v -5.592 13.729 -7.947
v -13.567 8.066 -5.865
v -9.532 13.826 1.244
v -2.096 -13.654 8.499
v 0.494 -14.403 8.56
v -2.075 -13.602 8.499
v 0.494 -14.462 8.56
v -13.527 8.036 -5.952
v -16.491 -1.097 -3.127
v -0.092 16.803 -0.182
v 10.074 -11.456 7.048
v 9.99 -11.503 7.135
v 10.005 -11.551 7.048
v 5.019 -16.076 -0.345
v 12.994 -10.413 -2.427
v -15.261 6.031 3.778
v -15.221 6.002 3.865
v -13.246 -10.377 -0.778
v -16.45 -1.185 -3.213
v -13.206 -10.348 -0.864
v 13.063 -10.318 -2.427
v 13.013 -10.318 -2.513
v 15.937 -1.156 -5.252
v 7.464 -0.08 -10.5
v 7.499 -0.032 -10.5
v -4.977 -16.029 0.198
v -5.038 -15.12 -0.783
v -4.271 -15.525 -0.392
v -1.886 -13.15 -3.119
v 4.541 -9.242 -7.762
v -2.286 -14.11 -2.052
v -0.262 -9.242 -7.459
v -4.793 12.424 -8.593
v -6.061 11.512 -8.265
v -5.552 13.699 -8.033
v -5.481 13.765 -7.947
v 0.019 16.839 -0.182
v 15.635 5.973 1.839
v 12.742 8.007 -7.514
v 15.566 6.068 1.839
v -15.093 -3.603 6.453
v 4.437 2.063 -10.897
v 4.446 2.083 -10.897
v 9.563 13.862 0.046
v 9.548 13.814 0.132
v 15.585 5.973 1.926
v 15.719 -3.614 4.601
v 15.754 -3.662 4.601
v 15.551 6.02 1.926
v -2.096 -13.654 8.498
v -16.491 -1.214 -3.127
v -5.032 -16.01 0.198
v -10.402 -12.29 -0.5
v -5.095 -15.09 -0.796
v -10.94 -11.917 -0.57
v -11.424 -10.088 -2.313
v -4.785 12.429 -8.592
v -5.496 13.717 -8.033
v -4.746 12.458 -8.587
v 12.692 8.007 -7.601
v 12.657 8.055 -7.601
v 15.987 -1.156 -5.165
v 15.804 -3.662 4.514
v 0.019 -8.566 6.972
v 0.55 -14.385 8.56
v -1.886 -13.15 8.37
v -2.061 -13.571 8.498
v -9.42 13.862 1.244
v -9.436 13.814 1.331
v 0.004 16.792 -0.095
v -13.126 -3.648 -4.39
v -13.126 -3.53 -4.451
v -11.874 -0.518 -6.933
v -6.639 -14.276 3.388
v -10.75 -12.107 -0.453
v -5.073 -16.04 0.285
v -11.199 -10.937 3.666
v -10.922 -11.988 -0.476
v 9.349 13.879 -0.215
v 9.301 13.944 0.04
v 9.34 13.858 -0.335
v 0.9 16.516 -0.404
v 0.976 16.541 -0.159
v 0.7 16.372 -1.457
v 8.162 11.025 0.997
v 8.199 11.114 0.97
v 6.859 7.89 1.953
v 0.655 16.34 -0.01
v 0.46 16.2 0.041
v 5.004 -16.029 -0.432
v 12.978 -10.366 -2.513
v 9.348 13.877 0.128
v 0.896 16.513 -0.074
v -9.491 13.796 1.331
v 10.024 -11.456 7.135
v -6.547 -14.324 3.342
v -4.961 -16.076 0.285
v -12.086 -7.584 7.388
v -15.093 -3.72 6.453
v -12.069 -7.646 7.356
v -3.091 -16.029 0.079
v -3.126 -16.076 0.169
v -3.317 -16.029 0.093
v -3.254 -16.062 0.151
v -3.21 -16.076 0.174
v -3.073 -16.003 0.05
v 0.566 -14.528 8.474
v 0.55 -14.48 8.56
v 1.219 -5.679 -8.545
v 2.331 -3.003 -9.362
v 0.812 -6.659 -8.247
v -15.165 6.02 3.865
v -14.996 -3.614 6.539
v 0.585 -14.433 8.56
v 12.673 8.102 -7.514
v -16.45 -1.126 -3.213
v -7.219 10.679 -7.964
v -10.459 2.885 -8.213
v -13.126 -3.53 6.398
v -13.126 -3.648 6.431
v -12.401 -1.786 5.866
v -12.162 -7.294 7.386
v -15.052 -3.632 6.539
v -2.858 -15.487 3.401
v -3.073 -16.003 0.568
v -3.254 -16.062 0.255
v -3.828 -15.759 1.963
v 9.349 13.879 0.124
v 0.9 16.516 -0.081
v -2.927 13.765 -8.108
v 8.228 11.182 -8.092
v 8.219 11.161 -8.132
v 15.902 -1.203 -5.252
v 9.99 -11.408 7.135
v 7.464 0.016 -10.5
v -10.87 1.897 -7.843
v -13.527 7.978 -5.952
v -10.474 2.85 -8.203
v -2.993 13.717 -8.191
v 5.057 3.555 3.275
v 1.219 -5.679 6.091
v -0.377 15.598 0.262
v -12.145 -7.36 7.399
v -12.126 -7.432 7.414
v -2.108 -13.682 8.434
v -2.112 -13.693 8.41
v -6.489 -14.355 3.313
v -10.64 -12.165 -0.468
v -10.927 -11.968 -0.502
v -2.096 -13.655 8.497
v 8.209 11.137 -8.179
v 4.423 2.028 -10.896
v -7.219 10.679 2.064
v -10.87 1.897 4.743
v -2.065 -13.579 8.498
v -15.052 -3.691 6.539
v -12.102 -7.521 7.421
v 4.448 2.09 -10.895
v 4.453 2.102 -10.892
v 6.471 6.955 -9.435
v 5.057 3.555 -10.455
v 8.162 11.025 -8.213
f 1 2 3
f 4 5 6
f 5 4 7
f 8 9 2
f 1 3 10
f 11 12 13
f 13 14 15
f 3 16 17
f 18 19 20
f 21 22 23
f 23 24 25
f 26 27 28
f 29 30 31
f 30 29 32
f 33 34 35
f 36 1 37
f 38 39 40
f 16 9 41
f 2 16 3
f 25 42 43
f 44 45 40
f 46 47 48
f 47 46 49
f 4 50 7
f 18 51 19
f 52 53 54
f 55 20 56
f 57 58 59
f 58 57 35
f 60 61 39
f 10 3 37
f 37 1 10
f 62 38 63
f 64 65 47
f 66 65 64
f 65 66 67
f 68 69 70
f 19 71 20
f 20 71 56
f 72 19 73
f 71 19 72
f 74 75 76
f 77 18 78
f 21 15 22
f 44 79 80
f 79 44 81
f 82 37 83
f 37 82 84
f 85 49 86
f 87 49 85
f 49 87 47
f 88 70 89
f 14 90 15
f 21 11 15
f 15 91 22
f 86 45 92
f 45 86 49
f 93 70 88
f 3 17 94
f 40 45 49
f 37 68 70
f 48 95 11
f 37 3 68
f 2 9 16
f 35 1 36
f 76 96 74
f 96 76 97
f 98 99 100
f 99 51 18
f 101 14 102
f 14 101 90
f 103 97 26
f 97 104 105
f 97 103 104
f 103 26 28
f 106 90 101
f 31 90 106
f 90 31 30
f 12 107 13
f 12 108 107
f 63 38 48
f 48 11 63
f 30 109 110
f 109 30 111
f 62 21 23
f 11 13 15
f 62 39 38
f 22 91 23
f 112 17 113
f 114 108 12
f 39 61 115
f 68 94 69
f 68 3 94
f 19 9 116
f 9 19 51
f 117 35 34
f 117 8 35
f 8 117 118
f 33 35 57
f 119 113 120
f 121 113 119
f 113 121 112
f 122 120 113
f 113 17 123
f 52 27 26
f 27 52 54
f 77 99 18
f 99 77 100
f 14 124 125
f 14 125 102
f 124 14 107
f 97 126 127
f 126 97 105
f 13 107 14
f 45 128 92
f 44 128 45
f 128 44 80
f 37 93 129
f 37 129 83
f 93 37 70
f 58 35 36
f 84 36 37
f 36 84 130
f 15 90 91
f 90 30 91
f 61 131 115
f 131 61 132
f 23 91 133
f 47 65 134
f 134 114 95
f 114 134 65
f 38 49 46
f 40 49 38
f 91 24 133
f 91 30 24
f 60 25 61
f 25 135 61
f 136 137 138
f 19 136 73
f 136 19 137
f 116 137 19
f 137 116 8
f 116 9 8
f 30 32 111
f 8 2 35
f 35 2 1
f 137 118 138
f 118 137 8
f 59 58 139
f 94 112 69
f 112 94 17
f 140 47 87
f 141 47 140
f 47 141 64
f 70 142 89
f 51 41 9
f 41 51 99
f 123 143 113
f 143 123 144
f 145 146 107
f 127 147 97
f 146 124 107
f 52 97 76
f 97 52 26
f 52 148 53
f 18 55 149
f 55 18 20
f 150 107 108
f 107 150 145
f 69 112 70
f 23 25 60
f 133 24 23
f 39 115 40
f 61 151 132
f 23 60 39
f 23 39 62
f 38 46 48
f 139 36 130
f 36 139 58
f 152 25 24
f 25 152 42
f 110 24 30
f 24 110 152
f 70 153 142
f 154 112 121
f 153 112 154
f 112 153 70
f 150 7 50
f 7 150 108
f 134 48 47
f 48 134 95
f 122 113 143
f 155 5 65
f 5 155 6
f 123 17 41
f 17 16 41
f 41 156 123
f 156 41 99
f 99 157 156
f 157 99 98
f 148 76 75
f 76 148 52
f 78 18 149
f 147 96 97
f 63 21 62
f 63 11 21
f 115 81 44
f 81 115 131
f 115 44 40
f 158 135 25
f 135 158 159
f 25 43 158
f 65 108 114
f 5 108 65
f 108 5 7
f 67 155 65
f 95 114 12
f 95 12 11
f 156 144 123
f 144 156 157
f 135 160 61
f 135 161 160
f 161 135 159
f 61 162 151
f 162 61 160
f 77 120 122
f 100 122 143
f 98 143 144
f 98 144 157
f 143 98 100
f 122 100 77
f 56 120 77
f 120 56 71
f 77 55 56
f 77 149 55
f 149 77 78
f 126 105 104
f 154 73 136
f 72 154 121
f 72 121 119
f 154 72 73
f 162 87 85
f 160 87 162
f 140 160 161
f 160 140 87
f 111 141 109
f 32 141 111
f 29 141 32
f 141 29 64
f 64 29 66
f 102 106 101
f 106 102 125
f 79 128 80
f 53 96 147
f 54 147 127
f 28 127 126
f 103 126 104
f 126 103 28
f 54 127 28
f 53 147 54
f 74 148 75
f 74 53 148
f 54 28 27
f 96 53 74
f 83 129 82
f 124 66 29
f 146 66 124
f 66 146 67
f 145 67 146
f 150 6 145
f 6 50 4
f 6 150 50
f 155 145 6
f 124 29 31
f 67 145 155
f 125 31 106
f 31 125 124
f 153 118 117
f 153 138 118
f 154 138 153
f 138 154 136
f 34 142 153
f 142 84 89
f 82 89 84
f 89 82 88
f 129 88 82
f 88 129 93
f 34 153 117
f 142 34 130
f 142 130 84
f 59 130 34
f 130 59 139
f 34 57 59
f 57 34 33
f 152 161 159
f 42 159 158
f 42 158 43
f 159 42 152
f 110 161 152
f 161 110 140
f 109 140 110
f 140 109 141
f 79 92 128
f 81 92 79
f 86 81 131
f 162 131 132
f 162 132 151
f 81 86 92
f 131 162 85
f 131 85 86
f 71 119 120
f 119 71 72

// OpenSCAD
// Auto-generated OpenSCAD file

    inner_points = 10*[[0.0981256772482181, 1.6457575604228036, -0.49999971188637654], [-1.0832035552174737, -1.1961778079047776, 0.5000005689987711], [-0.1274890829740991, 1.102996499198401, -1.309016652616536], [0.09812663002150081, 1.6457572632118638, 0.5000002881131254], [-1.0832045079907566, -1.1961775106938377, -0.49999943100073085], [-0.8575887949951567, -0.6534167466803746, 1.3090175097289307], [-0.4925404806041831, 0.22479035715641538, -1.618033560192892], [-0.127486588581261, 1.1029957210900594, 1.3090173361320547], [-0.8575912893879948, -0.6534159685720329, -1.3090164790196603], [-0.4925373973650727, 0.224789395361611, 1.6180344173052863], [0.8062478731875907, 1.1025170792040677, -0.951057064318678], [0.9248610728923187, 1.3878632992834963, -5.762265201658678e-07], [-0.317262991238858, -1.6003240717335458, -2.808858743374998e-07], [-0.19864979153413004, -1.314977851654117, 0.9510562072062835], [0.495716297128712, 0.3554704111460145, -1.5388422427756967], [0.8062496854700688, 1.102516513875266, 0.951055968270682], [-0.19865160381660824, -1.3149772863253153, -0.9510568253830763], [0.11188178452474858, -0.5679311835960638, 1.5388413856633023], [0.1118788521901014, -0.5679302688748477, -1.538842151510418], [0.4957192294633592, 0.3554694964247984, 1.5388412943980236], [-0.7138464220032689, 1.0620613123307217, -0.4999991117419643], [-1.3045110382361147, -0.3589063718330689, 1.0287006094733542e-06], [-0.7138454692299859, 1.062061015119782, 0.5000008882575375], [-1.0788962780137976, 0.18385468939133373, 0.8090179694307691], [-1.0788978196333527, 0.183855170288736, -0.8090160193183198]];

    outer_points = 10*[[-1.6409889130468513, -0.11555950142177197, -0.3126779904387301], [1.5886524541888336, -0.11555950142177197, -0.5165225244336256], [-1.348640822211601, 0.8007073739998204, -0.5865166414544996], [-1.3165303884764263, -1.0318263768433644, -0.07777018120554417], [1.2641939296184086, 0.8007073739998204, -0.7514303336668116], [1.2963043633535833, -1.0318263768433644, -0.24268387341785624], [-0.5511531501235996, 1.3669914457760302, -0.7946890769982492], [-0.4991973769465854, -1.5981104486195743, 0.028479987340757858], [0.4468609180885676, 1.3669914457760302, -0.8576805022131136], [0.4988166912655817, -1.5981104486195743, -0.03451143787410652], [-1.5180582313930455, 0.5972695048350894, 0.3778021724529971], [-1.5011767773548241, -0.3661505019915455, 0.6452660147863529], [1.5535132362128419, 0.5972695048350894, 0.1839345000860028], [1.5703946902510633, -0.3661505019915455, 0.4513983424193586], [-0.9450976637241996, 1.376692663078665, 0.12439394786230915], [-0.9009014432726172, -1.1455736602351207, 0.8246233778526778], [0.9532379021306351, 1.376692663078665, 0.004577137019677928], [0.9974341225822174, -1.1455736602351207, 0.7048065670100466], [-0.001146536984352193, 1.674405817908923, -0.018165330220834972], [0.05348299584236998, -1.4432868150653788, 0.8473658450931907], [-0.8699212728256985, -0.0032034345028971734, -0.9394401530094331], [0.744899410792144, -0.0032034345028971734, -1.0413624200068807], [-0.5454627482552734, -0.9194703099244896, -0.704532343776247], [0.4525513199568937, -0.9194703099244896, -0.7675237689911114], [-0.07243360073769692, 0.5630806372733126, -1.1476125885531827]];

    // Convex hull for inner set (I)
    module inner_hull() {
        hull() {
            for (p = inner_points) {
                translate(p) sphere(r=0.1);
            }
        }
    }

    // Convex hull for outer set (O) minus inner hull (O \ I)
    module outer_minus_inner() {
        difference() {
            hull() {
                for (p = outer_points) {
                    translate(p) sphere(r=0.1);
                }
            }
            inner_hull(); // Subtract inner hull
        }
    }

    // Convex hull for outer set (O) minus all translated inner hulls
    module outer_minus_AllTranslationInner() {
        difference() {
            hull() {
                for (p = outer_points) {
                    translate(p) sphere(r=0.1);
                }
            }
            hull() {
                translate([0,0,50]) inner_hull();
                translate([0,0,-50]) inner_hull();
            }; // Subtract translated inner hulls
        }
    }

    // Difference between outer_minus_inner and outer_minus_AllTranslationInner
    module outer_minus_inner_diff() {
        difference() {
            // Outer minus inner
            difference() {
                hull() {
                    for (p = outer_points) {
                        translate(p) sphere(r=0.1);
                    }
                }
                inner_hull();
            }

            // Subtract Outer minus AllTranslationInner
            difference() {
                hull() {
                    for (p = outer_points) {
                        translate(p) sphere(r=0.1);
                    }
                }
                hull() {
                    translate([0,0,50]) inner_hull();
                    translate([0,0,-50]) inner_hull();
                };
            }
        }
    }

    // Rendering all with colors applied
    color([0, 1, 0, 1]) outer_minus_AllTranslationInner(); // Opaque green
    
